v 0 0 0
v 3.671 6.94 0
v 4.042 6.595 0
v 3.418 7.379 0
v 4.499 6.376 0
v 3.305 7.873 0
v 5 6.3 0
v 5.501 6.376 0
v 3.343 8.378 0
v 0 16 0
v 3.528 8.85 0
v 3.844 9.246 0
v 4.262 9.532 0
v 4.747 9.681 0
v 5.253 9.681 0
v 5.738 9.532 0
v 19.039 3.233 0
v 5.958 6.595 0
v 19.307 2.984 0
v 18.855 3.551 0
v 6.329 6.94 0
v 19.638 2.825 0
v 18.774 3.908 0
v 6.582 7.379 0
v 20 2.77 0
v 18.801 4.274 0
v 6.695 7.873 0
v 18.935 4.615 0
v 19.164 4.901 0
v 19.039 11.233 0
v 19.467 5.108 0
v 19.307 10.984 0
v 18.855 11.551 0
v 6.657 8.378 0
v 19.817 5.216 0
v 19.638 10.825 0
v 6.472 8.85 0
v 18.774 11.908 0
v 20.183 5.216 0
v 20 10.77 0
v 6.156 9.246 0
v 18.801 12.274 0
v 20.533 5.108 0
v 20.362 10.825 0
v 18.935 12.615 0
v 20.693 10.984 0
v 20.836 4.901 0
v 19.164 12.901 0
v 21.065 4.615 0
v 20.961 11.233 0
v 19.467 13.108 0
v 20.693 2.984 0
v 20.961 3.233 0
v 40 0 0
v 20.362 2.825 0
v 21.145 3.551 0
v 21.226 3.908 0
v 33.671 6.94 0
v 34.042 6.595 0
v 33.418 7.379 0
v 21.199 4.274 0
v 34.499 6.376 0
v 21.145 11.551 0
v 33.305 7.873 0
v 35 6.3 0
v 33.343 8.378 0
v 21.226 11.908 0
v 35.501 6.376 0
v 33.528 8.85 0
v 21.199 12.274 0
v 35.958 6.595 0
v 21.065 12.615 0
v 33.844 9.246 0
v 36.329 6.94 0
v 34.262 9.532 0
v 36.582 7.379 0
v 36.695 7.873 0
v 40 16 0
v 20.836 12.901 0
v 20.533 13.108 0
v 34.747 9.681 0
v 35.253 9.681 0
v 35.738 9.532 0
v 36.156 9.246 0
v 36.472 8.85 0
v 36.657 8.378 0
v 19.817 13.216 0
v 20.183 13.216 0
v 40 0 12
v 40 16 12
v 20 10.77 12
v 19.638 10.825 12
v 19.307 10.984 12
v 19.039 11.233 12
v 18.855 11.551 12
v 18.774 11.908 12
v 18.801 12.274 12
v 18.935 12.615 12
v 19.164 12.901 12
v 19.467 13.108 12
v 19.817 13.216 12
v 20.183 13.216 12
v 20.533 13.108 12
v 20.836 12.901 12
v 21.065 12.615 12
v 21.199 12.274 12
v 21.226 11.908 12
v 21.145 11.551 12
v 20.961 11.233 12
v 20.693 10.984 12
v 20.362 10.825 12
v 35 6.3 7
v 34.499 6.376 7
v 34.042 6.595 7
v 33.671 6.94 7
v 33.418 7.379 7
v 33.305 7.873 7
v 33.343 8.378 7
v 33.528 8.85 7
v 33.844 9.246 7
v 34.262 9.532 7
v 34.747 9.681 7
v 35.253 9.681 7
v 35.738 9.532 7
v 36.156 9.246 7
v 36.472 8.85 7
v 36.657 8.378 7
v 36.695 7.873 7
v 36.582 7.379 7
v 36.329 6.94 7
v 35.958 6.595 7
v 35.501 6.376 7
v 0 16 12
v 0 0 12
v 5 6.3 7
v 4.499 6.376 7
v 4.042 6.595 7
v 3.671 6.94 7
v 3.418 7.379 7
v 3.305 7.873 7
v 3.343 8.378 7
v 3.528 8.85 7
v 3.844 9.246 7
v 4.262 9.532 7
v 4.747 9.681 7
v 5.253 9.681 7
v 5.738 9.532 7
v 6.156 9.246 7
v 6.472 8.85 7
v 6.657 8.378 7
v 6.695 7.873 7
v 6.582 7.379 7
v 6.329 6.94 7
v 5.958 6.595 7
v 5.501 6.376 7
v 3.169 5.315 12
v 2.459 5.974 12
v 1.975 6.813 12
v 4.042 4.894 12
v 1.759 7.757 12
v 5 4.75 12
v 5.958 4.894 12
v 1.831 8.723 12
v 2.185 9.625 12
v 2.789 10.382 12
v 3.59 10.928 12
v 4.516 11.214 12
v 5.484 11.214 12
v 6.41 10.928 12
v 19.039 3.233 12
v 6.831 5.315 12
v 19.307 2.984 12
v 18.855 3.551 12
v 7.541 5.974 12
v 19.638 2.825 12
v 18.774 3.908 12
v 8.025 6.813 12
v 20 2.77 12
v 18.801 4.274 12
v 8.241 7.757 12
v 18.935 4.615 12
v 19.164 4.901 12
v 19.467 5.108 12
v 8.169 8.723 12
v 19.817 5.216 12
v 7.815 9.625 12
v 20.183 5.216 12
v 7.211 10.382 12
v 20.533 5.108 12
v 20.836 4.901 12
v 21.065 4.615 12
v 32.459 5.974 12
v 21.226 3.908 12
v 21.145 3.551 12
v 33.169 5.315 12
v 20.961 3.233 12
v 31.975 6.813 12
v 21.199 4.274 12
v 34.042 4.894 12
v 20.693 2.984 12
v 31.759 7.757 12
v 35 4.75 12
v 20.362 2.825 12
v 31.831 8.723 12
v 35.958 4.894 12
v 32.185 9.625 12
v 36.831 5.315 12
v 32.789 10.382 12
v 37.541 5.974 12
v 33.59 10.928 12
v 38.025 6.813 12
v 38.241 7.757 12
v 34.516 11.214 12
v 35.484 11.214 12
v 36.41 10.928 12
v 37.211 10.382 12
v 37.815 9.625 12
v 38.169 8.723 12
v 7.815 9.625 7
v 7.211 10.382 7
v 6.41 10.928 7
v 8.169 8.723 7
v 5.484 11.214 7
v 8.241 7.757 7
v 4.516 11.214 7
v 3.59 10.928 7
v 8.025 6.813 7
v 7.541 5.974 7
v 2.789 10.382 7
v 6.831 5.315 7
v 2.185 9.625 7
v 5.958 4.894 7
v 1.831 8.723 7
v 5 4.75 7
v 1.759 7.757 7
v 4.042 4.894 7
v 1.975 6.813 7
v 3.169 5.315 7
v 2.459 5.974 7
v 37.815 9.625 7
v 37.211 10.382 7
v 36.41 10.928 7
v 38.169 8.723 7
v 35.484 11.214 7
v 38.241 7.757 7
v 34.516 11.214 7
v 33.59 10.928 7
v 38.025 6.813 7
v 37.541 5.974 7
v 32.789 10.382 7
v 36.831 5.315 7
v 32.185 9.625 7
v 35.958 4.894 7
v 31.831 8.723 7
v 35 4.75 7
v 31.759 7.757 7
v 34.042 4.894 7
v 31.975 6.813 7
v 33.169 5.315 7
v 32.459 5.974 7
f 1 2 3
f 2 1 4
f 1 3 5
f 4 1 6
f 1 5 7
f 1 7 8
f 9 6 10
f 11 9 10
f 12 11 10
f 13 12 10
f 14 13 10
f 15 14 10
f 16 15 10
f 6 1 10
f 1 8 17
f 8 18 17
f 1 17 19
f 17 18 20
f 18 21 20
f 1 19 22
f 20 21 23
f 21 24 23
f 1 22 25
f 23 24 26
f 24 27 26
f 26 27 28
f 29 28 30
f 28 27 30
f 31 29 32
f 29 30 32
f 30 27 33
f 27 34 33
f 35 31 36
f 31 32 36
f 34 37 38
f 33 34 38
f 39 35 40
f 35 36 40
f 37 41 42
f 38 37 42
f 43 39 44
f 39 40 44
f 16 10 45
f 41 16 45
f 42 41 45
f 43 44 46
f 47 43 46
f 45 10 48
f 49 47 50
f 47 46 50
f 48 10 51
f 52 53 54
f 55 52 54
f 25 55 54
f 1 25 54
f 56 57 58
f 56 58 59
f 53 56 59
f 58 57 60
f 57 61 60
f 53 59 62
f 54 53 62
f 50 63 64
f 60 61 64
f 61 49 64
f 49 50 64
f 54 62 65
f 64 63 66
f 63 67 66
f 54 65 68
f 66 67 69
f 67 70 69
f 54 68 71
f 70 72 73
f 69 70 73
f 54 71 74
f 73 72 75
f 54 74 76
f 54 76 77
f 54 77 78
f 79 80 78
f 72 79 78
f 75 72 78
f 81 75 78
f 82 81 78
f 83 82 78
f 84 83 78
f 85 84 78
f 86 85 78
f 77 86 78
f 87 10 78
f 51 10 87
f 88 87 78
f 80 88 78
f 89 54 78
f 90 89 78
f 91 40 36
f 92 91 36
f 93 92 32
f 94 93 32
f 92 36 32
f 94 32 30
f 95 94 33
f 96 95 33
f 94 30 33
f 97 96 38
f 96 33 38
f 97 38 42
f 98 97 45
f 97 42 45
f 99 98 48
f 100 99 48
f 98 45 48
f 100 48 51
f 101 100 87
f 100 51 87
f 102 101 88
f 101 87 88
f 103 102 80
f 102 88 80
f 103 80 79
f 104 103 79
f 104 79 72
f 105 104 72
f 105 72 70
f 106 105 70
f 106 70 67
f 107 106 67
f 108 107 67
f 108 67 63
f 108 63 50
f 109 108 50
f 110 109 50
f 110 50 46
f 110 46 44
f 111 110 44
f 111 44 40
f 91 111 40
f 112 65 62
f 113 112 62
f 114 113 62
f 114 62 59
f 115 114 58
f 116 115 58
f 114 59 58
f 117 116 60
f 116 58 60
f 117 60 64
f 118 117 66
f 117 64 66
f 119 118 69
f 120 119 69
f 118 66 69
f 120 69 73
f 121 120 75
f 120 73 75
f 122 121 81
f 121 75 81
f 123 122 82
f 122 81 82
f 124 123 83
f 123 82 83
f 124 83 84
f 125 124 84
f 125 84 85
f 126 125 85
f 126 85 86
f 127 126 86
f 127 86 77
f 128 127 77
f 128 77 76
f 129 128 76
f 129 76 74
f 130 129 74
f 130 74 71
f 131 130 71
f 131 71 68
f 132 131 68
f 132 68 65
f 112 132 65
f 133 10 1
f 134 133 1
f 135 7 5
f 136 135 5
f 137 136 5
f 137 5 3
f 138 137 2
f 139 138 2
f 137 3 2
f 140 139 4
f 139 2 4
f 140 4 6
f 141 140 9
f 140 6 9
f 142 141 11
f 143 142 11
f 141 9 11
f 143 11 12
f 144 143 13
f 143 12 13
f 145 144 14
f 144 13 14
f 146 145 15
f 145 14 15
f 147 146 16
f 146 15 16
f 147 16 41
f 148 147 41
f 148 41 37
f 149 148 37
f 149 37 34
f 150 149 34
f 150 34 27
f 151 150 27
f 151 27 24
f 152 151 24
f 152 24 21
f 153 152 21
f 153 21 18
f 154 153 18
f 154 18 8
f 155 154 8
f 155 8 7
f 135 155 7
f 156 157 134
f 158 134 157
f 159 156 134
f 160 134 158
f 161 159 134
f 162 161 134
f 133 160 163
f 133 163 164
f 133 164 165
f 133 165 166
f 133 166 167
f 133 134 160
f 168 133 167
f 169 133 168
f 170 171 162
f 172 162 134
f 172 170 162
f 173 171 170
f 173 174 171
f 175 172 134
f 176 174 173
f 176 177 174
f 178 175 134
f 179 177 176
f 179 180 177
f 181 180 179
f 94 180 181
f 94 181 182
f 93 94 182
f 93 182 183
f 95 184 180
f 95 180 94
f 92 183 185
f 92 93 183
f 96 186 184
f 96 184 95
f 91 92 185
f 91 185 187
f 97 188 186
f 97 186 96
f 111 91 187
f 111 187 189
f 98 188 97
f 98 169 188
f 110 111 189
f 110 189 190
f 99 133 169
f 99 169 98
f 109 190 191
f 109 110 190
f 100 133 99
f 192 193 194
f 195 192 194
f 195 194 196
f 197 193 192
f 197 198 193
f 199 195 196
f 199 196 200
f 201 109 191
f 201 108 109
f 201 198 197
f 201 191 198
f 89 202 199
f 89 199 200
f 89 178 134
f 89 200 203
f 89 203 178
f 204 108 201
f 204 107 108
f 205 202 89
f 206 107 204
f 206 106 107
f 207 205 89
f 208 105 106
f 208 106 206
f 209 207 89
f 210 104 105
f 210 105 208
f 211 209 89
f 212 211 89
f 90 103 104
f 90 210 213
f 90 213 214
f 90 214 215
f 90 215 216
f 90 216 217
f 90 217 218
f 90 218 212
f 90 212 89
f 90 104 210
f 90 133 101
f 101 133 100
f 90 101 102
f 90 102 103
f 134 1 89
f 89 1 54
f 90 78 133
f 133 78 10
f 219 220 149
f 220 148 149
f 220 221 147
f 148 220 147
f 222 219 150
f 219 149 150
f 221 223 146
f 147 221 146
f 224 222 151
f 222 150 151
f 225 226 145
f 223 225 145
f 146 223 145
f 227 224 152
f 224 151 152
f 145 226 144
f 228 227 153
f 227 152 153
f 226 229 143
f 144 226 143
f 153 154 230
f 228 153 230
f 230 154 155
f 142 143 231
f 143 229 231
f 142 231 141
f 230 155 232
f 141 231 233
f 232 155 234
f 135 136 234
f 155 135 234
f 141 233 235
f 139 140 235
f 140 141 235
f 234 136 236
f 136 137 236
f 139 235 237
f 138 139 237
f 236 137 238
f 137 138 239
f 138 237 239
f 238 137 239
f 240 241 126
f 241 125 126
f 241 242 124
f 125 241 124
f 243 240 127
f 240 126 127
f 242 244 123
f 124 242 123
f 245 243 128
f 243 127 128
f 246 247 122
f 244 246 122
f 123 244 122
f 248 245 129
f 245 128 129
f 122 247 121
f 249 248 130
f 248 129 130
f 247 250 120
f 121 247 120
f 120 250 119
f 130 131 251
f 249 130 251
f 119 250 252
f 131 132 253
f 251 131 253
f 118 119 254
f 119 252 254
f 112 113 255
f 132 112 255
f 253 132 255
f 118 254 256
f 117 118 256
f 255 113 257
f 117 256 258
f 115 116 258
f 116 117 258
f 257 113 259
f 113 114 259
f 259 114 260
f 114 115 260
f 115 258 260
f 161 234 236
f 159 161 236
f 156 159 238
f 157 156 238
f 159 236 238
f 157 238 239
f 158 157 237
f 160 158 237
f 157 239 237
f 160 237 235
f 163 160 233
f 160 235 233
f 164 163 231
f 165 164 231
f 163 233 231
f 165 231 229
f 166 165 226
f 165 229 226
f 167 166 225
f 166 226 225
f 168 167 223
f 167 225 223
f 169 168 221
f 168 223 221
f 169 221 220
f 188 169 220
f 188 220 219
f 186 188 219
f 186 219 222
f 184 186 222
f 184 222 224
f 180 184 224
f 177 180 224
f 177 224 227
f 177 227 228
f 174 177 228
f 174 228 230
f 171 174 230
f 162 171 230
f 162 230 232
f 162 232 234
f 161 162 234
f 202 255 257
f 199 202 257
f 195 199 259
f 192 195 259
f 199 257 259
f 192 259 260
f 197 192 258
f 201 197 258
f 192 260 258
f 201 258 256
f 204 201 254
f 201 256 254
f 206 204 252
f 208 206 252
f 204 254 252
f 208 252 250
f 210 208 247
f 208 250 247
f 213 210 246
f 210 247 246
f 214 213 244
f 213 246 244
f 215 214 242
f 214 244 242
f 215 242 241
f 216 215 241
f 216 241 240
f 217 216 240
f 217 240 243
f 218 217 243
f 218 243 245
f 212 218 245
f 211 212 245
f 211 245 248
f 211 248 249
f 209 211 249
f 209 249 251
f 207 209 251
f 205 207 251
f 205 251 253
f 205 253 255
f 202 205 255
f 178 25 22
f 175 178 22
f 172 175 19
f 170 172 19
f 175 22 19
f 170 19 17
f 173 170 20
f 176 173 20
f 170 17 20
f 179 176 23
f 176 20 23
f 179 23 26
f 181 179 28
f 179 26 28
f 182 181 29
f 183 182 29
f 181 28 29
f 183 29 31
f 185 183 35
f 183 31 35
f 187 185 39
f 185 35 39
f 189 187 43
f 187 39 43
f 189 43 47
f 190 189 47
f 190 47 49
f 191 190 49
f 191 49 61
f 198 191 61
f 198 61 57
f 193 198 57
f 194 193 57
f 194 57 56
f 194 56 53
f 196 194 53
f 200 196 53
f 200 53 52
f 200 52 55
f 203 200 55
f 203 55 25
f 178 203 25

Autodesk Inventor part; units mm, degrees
ref_plane "YZ Plane" through (0, 0, 0) normal (1, 0, 0) x (0, 1, 0)
ref_plane "XZ Plane" through (0, 0, 0) normal (0, 1, 0) x (-1, 0, 0)
ref_plane "XY Plane" through (0, 0, 0) normal (0, 0, 1) x (1, 0, 0)
sketch "Skizze1" plane through (0, 0, 0) normal (0, 0, 1) x (1, 0, 0)
  line L0 (0, 0) -> (40, 0)
  line L1 (40, 0) -> (40, 16)
  line L2 (40, 16) -> (0, 16)
  line L3 (0, 16) -> (0, 0)
  dimension "d0" = 16
  dimension "d1" = 40
extrude "Extrusion1" add sketch "Skizze1" along normal blind 12
sketch "Skizze2" plane through (0, 0, 12) normal (0, 0, 1) x (1, 0, 0)
  line L0 (40, 0) -> (0, 0) projected
  line L1 (0, 16) -> (40, 16) projected
  line L2 (20, 16) -> (20, 0)
  point P0 (20, 12)
  point P1 (20, 4)
  dimension "d4" = 4
  dimension "d5" = 8
hole "Bohrung1" at (20, 12, 12) at (20, 4, 12) direction (0, 0, -1) diameter 2.459 end through all thread size "M3x0.5" class "6H" standard "ISO Metric profile"
sketch "Skizze3" plane through (0, 0, 12) normal (0, 0, 1) x (1, 0, 0)
  line L0 (0, 0) -> (0, 16) projected
  line L1 (40, 0) -> (0, 0) projected
  line L2 (40, 16) -> (40, 0) projected
  line L3 (0, 16) -> (40, 16) projected
  line L4 (0, 8) -> (40, 8)
  line L5 (20, 16) -> (20, 0)
  point P0 (5, 8)
  point P1 (35, 8)
  dimension "d13" = 30
hole "Bohrung2" at (5, 8, 12) at (35, 8, 12) direction (0, 0, -1) diameter 3.4 end through all counterbore diameter 6.5 counterbore depth 5
properties part number "13_0204_069"
